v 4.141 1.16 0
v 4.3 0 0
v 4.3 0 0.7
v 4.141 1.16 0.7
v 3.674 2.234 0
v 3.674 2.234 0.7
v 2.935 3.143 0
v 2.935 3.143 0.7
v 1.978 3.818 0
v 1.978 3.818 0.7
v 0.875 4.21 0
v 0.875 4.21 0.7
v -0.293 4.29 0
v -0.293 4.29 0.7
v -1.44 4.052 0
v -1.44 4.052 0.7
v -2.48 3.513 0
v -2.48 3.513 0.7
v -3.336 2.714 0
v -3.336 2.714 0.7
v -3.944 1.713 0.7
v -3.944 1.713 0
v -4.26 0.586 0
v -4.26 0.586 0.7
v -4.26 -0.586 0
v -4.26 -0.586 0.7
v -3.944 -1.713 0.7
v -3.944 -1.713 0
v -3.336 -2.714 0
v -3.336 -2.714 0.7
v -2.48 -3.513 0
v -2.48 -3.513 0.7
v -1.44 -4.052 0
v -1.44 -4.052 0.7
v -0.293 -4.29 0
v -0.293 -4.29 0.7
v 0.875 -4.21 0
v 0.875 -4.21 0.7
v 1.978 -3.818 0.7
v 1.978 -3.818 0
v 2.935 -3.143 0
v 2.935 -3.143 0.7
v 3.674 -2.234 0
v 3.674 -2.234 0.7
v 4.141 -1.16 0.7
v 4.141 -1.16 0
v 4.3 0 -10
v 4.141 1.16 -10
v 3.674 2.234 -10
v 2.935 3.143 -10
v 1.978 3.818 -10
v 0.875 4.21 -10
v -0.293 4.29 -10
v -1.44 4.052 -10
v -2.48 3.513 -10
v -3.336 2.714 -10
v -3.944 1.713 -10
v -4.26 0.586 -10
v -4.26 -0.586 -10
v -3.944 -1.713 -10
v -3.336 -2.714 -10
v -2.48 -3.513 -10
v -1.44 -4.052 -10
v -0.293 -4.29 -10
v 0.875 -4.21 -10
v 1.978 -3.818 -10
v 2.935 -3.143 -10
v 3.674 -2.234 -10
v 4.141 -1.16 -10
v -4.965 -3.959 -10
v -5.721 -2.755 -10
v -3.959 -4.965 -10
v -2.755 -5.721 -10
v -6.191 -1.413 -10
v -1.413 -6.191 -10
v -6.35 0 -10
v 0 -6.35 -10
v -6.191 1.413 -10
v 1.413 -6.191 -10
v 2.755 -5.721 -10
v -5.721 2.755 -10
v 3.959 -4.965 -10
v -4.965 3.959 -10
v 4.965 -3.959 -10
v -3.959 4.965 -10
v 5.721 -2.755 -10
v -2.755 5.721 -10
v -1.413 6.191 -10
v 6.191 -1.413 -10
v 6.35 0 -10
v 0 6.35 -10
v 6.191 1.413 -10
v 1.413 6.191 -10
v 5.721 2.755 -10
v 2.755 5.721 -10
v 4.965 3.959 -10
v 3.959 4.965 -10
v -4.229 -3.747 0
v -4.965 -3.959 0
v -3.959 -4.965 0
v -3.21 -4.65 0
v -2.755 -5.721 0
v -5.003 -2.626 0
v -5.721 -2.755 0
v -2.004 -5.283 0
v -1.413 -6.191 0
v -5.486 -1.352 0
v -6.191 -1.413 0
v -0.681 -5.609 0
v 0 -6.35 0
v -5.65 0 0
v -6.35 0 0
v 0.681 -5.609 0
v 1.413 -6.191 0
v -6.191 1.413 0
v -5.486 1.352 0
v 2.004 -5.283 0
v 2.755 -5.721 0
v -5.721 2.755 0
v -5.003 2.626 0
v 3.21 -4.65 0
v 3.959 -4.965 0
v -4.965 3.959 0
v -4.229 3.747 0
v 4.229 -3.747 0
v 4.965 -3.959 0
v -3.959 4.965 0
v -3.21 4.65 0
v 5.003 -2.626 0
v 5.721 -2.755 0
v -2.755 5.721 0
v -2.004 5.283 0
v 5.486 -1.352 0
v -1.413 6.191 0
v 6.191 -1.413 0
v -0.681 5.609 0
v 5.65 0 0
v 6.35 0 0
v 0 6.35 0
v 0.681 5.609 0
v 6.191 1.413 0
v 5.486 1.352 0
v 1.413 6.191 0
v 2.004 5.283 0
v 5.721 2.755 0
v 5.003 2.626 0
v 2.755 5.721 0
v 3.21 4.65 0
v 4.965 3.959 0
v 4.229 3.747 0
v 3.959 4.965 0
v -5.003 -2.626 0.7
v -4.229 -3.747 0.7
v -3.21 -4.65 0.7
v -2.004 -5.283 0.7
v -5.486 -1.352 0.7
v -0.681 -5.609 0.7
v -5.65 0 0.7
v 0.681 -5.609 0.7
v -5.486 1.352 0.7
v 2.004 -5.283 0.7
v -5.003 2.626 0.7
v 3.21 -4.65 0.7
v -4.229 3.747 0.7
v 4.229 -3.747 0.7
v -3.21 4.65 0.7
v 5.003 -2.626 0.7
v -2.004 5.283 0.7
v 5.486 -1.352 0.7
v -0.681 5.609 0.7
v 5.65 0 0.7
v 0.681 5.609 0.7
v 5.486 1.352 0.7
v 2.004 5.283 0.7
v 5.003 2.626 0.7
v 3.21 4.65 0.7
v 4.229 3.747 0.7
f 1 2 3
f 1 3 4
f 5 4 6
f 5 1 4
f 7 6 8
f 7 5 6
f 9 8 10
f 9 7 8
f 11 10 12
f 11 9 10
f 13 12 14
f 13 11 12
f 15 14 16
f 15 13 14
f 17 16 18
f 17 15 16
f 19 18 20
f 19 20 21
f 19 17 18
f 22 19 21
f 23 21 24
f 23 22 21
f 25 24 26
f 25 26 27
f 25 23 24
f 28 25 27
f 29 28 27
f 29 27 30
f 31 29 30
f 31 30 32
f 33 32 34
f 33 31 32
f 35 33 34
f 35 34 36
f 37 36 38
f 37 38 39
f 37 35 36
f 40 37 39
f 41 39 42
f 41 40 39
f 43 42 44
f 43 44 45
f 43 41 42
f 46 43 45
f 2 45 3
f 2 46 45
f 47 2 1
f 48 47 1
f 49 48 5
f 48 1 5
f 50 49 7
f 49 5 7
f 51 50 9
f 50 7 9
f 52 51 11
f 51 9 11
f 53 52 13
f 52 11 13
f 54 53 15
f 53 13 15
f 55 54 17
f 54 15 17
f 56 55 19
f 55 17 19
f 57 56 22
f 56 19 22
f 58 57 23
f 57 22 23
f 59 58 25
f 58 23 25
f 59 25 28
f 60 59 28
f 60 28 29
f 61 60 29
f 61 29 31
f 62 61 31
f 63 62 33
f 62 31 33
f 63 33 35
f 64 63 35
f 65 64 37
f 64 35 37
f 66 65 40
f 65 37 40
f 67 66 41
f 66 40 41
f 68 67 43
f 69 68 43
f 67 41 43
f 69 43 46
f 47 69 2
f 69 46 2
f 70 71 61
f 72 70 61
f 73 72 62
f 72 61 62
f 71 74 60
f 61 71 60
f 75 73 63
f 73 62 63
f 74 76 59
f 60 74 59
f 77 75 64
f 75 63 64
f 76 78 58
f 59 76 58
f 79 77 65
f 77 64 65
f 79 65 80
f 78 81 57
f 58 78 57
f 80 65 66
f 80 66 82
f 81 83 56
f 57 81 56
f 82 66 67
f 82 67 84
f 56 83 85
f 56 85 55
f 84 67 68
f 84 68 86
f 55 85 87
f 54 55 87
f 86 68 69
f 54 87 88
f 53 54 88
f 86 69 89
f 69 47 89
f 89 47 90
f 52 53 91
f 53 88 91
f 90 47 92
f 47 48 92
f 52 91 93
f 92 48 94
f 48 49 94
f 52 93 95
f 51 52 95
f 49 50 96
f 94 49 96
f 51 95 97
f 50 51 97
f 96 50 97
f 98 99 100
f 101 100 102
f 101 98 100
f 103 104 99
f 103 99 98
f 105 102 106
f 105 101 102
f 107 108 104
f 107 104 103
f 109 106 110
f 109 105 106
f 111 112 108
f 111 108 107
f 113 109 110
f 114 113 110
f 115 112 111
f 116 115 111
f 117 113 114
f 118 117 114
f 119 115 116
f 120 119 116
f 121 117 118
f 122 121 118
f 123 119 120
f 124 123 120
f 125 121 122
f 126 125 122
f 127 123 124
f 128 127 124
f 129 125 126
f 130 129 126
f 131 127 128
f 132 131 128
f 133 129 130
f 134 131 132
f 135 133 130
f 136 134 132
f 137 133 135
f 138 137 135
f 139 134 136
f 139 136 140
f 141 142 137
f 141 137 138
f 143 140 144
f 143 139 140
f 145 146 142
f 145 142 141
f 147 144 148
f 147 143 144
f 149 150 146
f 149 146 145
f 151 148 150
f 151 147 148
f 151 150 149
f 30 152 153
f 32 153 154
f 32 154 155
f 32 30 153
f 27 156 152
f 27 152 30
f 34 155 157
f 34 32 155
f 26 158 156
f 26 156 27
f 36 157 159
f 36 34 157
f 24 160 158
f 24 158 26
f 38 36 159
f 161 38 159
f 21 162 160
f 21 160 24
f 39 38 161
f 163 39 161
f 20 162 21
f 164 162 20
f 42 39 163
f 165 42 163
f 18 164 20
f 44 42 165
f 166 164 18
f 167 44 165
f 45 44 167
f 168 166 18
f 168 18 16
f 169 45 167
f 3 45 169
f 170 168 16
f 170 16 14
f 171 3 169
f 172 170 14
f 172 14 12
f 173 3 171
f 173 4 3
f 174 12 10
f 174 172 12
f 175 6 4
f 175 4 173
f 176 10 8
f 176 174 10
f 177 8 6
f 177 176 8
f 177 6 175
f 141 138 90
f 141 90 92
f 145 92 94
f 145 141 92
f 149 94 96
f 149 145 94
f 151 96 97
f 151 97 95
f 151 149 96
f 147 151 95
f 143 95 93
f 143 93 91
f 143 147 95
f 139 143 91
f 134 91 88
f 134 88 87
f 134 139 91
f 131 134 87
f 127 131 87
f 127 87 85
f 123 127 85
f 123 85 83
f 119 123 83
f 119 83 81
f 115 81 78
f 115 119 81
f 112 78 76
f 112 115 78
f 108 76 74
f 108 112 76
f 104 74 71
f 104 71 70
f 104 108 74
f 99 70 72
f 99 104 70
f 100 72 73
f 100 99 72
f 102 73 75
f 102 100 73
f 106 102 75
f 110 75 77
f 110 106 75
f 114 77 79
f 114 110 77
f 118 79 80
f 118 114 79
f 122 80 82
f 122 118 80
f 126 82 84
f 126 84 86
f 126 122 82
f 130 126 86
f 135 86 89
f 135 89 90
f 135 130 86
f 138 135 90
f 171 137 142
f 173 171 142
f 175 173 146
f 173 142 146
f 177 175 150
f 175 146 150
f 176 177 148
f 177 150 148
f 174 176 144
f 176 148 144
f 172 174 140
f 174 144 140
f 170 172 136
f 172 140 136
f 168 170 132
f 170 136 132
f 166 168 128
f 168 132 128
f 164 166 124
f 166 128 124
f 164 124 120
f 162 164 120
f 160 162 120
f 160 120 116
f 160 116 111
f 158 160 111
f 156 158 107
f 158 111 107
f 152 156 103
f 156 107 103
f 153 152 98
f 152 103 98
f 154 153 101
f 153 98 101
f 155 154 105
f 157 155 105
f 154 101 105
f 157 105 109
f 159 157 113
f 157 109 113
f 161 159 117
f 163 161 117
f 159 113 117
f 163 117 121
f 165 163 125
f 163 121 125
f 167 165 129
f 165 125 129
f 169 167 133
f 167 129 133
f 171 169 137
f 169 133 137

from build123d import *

# Parameters (mm, degrees)
F0_R     = 5.65
F0_R_2   = 4.3
F1_DEPTH = 0.7
F0_R_3   = 6.35
F2_DEPTH = 10


with BuildPart() as f1:
    # F0 (on Top) → F1 (new body)
    with BuildSketch(Plane.XY):
        Circle(F0_R)
        Circle(F0_R_2, mode=Mode.SUBTRACT)
    extrude(amount=F1_DEPTH)

    # F0 (on Top) → F2 (join)
    with BuildSketch(Plane.XY):
        Circle(F0_R_3)
        Circle(F0_R, mode=Mode.SUBTRACT)
        Circle(F0_R)
        Circle(F0_R_2, mode=Mode.SUBTRACT)
    extrude(amount=-F2_DEPTH)


solid = f1.part
